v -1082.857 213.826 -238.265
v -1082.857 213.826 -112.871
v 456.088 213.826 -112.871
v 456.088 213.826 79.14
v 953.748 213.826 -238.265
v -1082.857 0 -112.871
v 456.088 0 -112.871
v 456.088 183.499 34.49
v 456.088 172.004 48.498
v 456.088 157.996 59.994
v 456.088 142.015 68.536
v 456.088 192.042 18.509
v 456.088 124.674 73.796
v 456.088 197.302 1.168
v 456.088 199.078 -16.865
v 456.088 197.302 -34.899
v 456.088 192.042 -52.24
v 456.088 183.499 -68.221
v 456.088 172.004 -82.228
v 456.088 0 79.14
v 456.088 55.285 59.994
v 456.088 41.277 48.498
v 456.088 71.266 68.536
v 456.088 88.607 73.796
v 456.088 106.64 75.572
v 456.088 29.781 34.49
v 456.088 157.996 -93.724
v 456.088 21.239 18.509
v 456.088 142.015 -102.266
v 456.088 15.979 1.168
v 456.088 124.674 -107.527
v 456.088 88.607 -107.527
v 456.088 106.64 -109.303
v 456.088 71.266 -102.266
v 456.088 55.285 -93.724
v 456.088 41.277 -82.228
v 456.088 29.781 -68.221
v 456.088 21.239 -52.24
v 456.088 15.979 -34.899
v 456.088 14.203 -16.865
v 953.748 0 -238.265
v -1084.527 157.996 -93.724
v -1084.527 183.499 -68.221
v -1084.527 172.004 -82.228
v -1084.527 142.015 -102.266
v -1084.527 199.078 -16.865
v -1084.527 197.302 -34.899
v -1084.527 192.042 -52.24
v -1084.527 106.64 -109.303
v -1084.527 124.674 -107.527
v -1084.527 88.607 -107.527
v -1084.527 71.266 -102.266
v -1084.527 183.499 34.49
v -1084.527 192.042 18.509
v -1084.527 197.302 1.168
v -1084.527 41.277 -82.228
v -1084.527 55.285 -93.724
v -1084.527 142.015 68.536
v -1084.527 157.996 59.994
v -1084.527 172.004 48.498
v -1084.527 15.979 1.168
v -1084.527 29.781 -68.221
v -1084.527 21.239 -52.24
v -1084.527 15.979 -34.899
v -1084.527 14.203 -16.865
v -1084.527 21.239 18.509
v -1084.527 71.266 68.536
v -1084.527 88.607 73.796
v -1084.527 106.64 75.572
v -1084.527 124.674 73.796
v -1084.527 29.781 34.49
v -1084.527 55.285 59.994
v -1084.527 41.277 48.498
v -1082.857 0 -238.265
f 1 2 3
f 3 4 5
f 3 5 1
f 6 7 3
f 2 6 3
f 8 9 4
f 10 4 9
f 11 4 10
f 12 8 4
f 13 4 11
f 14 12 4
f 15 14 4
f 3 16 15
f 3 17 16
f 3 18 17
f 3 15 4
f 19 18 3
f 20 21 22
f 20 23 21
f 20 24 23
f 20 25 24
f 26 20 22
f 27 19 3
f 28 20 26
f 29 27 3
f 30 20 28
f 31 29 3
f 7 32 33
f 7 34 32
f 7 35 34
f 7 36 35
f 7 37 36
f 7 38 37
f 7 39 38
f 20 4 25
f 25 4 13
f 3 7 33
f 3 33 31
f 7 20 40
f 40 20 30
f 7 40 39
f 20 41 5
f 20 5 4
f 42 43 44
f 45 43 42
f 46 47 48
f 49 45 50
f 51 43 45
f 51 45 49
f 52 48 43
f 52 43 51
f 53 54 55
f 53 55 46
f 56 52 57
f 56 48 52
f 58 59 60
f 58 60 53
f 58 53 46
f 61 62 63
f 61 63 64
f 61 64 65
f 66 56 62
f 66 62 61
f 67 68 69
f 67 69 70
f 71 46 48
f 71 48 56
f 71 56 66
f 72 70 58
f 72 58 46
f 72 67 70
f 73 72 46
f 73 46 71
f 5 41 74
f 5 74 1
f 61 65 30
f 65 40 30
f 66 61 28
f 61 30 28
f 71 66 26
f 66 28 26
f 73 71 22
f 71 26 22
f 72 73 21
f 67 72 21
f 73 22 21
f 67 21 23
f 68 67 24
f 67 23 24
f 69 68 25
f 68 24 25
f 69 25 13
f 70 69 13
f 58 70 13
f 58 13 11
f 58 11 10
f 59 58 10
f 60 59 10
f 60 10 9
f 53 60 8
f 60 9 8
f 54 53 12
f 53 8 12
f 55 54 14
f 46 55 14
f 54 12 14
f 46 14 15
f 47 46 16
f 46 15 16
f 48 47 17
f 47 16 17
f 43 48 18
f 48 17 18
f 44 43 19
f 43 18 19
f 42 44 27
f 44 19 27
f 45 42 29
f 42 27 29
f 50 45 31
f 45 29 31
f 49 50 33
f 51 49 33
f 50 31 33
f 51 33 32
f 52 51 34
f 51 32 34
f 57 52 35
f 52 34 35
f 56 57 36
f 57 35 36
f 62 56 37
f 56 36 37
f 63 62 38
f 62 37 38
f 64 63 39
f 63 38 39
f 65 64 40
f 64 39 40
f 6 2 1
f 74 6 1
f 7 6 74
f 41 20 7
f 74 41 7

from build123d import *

# Parameters (mm, degrees)
F1_DEPTH = 213.8261944056
F2_R     = 92.4374796953
F3_DEPTH = 834.0718746185
F4_DEPTH = 265.7555639744
F5_DEPTH = 264.6364271641
F6_DEPTH = 25.4
F7_DEPTH = 416.5059328079
F8_DEPTH = 22.0245998353


with BuildPart() as f1:
    # F0 (on Front) → F1 (new body)
    with BuildSketch(Plane.XZ):
        Polygon((-378.5704374313, -238.2651567459), (953.7476301193, -238.2651567459), (456.0876488686, 79.1400074959), (456.0876488686, -112.8705143929), (-378.5704374313, -112.8705143929), align=None)
    extrude(amount=-F1_DEPTH)

    # F2 (on face) → F3 (join)
    with BuildSketch(Plane(origin=(456.0876488686, 0, 0), x_dir=(0, -1, 0), z_dir=(-1, 0, 0))):
        with Locations((-106.6404283047, -16.8652534485)):
            Circle(F2_R)
    extrude(amount=F3_DEPTH)

    # F4 (add): a face of the model
    f4_faces = [f1.faces().sort_by_distance(p)[0] for p in [
        (-378.5704374313, 106.9130972028, -175.5678355694),
    ]]
    extrude(f4_faces, amount=F4_DEPTH)

    # F5 (add): a face of the model
    f5_faces = [f1.faces().sort_by_distance(p)[0] for p in [
        (-377.98422575, 106.6404283047, -16.8652534485),
    ]]
    extrude(f5_faces, amount=F5_DEPTH)

    # F6 (add): a face of the model
    f6_faces = [f1.faces().sort_by_distance(p)[0] for p in [
        (-642.620652914, 106.6404283047, -16.8652534485),
    ]]
    extrude(f6_faces, amount=F6_DEPTH)

    # F7 (add): faces of the model
    f7_faces = [f1.faces().sort_by_distance(p)[0] for p in [
        (-668.020652914, 106.6404283047, -16.8652534485),
        (-644.3260014057, 106.9130972028, -175.5678355694),
    ]]
    extrude(f7_faces, amount=F7_DEPTH)

    # F8 (add): a face of the model
    f8_faces = [f1.faces().sort_by_distance(p)[0] for p in [
        (-1060.8319342136, 106.9130972028, -175.5678355694),
    ]]
    extrude(f8_faces, amount=F8_DEPTH)


solid = f1.part
